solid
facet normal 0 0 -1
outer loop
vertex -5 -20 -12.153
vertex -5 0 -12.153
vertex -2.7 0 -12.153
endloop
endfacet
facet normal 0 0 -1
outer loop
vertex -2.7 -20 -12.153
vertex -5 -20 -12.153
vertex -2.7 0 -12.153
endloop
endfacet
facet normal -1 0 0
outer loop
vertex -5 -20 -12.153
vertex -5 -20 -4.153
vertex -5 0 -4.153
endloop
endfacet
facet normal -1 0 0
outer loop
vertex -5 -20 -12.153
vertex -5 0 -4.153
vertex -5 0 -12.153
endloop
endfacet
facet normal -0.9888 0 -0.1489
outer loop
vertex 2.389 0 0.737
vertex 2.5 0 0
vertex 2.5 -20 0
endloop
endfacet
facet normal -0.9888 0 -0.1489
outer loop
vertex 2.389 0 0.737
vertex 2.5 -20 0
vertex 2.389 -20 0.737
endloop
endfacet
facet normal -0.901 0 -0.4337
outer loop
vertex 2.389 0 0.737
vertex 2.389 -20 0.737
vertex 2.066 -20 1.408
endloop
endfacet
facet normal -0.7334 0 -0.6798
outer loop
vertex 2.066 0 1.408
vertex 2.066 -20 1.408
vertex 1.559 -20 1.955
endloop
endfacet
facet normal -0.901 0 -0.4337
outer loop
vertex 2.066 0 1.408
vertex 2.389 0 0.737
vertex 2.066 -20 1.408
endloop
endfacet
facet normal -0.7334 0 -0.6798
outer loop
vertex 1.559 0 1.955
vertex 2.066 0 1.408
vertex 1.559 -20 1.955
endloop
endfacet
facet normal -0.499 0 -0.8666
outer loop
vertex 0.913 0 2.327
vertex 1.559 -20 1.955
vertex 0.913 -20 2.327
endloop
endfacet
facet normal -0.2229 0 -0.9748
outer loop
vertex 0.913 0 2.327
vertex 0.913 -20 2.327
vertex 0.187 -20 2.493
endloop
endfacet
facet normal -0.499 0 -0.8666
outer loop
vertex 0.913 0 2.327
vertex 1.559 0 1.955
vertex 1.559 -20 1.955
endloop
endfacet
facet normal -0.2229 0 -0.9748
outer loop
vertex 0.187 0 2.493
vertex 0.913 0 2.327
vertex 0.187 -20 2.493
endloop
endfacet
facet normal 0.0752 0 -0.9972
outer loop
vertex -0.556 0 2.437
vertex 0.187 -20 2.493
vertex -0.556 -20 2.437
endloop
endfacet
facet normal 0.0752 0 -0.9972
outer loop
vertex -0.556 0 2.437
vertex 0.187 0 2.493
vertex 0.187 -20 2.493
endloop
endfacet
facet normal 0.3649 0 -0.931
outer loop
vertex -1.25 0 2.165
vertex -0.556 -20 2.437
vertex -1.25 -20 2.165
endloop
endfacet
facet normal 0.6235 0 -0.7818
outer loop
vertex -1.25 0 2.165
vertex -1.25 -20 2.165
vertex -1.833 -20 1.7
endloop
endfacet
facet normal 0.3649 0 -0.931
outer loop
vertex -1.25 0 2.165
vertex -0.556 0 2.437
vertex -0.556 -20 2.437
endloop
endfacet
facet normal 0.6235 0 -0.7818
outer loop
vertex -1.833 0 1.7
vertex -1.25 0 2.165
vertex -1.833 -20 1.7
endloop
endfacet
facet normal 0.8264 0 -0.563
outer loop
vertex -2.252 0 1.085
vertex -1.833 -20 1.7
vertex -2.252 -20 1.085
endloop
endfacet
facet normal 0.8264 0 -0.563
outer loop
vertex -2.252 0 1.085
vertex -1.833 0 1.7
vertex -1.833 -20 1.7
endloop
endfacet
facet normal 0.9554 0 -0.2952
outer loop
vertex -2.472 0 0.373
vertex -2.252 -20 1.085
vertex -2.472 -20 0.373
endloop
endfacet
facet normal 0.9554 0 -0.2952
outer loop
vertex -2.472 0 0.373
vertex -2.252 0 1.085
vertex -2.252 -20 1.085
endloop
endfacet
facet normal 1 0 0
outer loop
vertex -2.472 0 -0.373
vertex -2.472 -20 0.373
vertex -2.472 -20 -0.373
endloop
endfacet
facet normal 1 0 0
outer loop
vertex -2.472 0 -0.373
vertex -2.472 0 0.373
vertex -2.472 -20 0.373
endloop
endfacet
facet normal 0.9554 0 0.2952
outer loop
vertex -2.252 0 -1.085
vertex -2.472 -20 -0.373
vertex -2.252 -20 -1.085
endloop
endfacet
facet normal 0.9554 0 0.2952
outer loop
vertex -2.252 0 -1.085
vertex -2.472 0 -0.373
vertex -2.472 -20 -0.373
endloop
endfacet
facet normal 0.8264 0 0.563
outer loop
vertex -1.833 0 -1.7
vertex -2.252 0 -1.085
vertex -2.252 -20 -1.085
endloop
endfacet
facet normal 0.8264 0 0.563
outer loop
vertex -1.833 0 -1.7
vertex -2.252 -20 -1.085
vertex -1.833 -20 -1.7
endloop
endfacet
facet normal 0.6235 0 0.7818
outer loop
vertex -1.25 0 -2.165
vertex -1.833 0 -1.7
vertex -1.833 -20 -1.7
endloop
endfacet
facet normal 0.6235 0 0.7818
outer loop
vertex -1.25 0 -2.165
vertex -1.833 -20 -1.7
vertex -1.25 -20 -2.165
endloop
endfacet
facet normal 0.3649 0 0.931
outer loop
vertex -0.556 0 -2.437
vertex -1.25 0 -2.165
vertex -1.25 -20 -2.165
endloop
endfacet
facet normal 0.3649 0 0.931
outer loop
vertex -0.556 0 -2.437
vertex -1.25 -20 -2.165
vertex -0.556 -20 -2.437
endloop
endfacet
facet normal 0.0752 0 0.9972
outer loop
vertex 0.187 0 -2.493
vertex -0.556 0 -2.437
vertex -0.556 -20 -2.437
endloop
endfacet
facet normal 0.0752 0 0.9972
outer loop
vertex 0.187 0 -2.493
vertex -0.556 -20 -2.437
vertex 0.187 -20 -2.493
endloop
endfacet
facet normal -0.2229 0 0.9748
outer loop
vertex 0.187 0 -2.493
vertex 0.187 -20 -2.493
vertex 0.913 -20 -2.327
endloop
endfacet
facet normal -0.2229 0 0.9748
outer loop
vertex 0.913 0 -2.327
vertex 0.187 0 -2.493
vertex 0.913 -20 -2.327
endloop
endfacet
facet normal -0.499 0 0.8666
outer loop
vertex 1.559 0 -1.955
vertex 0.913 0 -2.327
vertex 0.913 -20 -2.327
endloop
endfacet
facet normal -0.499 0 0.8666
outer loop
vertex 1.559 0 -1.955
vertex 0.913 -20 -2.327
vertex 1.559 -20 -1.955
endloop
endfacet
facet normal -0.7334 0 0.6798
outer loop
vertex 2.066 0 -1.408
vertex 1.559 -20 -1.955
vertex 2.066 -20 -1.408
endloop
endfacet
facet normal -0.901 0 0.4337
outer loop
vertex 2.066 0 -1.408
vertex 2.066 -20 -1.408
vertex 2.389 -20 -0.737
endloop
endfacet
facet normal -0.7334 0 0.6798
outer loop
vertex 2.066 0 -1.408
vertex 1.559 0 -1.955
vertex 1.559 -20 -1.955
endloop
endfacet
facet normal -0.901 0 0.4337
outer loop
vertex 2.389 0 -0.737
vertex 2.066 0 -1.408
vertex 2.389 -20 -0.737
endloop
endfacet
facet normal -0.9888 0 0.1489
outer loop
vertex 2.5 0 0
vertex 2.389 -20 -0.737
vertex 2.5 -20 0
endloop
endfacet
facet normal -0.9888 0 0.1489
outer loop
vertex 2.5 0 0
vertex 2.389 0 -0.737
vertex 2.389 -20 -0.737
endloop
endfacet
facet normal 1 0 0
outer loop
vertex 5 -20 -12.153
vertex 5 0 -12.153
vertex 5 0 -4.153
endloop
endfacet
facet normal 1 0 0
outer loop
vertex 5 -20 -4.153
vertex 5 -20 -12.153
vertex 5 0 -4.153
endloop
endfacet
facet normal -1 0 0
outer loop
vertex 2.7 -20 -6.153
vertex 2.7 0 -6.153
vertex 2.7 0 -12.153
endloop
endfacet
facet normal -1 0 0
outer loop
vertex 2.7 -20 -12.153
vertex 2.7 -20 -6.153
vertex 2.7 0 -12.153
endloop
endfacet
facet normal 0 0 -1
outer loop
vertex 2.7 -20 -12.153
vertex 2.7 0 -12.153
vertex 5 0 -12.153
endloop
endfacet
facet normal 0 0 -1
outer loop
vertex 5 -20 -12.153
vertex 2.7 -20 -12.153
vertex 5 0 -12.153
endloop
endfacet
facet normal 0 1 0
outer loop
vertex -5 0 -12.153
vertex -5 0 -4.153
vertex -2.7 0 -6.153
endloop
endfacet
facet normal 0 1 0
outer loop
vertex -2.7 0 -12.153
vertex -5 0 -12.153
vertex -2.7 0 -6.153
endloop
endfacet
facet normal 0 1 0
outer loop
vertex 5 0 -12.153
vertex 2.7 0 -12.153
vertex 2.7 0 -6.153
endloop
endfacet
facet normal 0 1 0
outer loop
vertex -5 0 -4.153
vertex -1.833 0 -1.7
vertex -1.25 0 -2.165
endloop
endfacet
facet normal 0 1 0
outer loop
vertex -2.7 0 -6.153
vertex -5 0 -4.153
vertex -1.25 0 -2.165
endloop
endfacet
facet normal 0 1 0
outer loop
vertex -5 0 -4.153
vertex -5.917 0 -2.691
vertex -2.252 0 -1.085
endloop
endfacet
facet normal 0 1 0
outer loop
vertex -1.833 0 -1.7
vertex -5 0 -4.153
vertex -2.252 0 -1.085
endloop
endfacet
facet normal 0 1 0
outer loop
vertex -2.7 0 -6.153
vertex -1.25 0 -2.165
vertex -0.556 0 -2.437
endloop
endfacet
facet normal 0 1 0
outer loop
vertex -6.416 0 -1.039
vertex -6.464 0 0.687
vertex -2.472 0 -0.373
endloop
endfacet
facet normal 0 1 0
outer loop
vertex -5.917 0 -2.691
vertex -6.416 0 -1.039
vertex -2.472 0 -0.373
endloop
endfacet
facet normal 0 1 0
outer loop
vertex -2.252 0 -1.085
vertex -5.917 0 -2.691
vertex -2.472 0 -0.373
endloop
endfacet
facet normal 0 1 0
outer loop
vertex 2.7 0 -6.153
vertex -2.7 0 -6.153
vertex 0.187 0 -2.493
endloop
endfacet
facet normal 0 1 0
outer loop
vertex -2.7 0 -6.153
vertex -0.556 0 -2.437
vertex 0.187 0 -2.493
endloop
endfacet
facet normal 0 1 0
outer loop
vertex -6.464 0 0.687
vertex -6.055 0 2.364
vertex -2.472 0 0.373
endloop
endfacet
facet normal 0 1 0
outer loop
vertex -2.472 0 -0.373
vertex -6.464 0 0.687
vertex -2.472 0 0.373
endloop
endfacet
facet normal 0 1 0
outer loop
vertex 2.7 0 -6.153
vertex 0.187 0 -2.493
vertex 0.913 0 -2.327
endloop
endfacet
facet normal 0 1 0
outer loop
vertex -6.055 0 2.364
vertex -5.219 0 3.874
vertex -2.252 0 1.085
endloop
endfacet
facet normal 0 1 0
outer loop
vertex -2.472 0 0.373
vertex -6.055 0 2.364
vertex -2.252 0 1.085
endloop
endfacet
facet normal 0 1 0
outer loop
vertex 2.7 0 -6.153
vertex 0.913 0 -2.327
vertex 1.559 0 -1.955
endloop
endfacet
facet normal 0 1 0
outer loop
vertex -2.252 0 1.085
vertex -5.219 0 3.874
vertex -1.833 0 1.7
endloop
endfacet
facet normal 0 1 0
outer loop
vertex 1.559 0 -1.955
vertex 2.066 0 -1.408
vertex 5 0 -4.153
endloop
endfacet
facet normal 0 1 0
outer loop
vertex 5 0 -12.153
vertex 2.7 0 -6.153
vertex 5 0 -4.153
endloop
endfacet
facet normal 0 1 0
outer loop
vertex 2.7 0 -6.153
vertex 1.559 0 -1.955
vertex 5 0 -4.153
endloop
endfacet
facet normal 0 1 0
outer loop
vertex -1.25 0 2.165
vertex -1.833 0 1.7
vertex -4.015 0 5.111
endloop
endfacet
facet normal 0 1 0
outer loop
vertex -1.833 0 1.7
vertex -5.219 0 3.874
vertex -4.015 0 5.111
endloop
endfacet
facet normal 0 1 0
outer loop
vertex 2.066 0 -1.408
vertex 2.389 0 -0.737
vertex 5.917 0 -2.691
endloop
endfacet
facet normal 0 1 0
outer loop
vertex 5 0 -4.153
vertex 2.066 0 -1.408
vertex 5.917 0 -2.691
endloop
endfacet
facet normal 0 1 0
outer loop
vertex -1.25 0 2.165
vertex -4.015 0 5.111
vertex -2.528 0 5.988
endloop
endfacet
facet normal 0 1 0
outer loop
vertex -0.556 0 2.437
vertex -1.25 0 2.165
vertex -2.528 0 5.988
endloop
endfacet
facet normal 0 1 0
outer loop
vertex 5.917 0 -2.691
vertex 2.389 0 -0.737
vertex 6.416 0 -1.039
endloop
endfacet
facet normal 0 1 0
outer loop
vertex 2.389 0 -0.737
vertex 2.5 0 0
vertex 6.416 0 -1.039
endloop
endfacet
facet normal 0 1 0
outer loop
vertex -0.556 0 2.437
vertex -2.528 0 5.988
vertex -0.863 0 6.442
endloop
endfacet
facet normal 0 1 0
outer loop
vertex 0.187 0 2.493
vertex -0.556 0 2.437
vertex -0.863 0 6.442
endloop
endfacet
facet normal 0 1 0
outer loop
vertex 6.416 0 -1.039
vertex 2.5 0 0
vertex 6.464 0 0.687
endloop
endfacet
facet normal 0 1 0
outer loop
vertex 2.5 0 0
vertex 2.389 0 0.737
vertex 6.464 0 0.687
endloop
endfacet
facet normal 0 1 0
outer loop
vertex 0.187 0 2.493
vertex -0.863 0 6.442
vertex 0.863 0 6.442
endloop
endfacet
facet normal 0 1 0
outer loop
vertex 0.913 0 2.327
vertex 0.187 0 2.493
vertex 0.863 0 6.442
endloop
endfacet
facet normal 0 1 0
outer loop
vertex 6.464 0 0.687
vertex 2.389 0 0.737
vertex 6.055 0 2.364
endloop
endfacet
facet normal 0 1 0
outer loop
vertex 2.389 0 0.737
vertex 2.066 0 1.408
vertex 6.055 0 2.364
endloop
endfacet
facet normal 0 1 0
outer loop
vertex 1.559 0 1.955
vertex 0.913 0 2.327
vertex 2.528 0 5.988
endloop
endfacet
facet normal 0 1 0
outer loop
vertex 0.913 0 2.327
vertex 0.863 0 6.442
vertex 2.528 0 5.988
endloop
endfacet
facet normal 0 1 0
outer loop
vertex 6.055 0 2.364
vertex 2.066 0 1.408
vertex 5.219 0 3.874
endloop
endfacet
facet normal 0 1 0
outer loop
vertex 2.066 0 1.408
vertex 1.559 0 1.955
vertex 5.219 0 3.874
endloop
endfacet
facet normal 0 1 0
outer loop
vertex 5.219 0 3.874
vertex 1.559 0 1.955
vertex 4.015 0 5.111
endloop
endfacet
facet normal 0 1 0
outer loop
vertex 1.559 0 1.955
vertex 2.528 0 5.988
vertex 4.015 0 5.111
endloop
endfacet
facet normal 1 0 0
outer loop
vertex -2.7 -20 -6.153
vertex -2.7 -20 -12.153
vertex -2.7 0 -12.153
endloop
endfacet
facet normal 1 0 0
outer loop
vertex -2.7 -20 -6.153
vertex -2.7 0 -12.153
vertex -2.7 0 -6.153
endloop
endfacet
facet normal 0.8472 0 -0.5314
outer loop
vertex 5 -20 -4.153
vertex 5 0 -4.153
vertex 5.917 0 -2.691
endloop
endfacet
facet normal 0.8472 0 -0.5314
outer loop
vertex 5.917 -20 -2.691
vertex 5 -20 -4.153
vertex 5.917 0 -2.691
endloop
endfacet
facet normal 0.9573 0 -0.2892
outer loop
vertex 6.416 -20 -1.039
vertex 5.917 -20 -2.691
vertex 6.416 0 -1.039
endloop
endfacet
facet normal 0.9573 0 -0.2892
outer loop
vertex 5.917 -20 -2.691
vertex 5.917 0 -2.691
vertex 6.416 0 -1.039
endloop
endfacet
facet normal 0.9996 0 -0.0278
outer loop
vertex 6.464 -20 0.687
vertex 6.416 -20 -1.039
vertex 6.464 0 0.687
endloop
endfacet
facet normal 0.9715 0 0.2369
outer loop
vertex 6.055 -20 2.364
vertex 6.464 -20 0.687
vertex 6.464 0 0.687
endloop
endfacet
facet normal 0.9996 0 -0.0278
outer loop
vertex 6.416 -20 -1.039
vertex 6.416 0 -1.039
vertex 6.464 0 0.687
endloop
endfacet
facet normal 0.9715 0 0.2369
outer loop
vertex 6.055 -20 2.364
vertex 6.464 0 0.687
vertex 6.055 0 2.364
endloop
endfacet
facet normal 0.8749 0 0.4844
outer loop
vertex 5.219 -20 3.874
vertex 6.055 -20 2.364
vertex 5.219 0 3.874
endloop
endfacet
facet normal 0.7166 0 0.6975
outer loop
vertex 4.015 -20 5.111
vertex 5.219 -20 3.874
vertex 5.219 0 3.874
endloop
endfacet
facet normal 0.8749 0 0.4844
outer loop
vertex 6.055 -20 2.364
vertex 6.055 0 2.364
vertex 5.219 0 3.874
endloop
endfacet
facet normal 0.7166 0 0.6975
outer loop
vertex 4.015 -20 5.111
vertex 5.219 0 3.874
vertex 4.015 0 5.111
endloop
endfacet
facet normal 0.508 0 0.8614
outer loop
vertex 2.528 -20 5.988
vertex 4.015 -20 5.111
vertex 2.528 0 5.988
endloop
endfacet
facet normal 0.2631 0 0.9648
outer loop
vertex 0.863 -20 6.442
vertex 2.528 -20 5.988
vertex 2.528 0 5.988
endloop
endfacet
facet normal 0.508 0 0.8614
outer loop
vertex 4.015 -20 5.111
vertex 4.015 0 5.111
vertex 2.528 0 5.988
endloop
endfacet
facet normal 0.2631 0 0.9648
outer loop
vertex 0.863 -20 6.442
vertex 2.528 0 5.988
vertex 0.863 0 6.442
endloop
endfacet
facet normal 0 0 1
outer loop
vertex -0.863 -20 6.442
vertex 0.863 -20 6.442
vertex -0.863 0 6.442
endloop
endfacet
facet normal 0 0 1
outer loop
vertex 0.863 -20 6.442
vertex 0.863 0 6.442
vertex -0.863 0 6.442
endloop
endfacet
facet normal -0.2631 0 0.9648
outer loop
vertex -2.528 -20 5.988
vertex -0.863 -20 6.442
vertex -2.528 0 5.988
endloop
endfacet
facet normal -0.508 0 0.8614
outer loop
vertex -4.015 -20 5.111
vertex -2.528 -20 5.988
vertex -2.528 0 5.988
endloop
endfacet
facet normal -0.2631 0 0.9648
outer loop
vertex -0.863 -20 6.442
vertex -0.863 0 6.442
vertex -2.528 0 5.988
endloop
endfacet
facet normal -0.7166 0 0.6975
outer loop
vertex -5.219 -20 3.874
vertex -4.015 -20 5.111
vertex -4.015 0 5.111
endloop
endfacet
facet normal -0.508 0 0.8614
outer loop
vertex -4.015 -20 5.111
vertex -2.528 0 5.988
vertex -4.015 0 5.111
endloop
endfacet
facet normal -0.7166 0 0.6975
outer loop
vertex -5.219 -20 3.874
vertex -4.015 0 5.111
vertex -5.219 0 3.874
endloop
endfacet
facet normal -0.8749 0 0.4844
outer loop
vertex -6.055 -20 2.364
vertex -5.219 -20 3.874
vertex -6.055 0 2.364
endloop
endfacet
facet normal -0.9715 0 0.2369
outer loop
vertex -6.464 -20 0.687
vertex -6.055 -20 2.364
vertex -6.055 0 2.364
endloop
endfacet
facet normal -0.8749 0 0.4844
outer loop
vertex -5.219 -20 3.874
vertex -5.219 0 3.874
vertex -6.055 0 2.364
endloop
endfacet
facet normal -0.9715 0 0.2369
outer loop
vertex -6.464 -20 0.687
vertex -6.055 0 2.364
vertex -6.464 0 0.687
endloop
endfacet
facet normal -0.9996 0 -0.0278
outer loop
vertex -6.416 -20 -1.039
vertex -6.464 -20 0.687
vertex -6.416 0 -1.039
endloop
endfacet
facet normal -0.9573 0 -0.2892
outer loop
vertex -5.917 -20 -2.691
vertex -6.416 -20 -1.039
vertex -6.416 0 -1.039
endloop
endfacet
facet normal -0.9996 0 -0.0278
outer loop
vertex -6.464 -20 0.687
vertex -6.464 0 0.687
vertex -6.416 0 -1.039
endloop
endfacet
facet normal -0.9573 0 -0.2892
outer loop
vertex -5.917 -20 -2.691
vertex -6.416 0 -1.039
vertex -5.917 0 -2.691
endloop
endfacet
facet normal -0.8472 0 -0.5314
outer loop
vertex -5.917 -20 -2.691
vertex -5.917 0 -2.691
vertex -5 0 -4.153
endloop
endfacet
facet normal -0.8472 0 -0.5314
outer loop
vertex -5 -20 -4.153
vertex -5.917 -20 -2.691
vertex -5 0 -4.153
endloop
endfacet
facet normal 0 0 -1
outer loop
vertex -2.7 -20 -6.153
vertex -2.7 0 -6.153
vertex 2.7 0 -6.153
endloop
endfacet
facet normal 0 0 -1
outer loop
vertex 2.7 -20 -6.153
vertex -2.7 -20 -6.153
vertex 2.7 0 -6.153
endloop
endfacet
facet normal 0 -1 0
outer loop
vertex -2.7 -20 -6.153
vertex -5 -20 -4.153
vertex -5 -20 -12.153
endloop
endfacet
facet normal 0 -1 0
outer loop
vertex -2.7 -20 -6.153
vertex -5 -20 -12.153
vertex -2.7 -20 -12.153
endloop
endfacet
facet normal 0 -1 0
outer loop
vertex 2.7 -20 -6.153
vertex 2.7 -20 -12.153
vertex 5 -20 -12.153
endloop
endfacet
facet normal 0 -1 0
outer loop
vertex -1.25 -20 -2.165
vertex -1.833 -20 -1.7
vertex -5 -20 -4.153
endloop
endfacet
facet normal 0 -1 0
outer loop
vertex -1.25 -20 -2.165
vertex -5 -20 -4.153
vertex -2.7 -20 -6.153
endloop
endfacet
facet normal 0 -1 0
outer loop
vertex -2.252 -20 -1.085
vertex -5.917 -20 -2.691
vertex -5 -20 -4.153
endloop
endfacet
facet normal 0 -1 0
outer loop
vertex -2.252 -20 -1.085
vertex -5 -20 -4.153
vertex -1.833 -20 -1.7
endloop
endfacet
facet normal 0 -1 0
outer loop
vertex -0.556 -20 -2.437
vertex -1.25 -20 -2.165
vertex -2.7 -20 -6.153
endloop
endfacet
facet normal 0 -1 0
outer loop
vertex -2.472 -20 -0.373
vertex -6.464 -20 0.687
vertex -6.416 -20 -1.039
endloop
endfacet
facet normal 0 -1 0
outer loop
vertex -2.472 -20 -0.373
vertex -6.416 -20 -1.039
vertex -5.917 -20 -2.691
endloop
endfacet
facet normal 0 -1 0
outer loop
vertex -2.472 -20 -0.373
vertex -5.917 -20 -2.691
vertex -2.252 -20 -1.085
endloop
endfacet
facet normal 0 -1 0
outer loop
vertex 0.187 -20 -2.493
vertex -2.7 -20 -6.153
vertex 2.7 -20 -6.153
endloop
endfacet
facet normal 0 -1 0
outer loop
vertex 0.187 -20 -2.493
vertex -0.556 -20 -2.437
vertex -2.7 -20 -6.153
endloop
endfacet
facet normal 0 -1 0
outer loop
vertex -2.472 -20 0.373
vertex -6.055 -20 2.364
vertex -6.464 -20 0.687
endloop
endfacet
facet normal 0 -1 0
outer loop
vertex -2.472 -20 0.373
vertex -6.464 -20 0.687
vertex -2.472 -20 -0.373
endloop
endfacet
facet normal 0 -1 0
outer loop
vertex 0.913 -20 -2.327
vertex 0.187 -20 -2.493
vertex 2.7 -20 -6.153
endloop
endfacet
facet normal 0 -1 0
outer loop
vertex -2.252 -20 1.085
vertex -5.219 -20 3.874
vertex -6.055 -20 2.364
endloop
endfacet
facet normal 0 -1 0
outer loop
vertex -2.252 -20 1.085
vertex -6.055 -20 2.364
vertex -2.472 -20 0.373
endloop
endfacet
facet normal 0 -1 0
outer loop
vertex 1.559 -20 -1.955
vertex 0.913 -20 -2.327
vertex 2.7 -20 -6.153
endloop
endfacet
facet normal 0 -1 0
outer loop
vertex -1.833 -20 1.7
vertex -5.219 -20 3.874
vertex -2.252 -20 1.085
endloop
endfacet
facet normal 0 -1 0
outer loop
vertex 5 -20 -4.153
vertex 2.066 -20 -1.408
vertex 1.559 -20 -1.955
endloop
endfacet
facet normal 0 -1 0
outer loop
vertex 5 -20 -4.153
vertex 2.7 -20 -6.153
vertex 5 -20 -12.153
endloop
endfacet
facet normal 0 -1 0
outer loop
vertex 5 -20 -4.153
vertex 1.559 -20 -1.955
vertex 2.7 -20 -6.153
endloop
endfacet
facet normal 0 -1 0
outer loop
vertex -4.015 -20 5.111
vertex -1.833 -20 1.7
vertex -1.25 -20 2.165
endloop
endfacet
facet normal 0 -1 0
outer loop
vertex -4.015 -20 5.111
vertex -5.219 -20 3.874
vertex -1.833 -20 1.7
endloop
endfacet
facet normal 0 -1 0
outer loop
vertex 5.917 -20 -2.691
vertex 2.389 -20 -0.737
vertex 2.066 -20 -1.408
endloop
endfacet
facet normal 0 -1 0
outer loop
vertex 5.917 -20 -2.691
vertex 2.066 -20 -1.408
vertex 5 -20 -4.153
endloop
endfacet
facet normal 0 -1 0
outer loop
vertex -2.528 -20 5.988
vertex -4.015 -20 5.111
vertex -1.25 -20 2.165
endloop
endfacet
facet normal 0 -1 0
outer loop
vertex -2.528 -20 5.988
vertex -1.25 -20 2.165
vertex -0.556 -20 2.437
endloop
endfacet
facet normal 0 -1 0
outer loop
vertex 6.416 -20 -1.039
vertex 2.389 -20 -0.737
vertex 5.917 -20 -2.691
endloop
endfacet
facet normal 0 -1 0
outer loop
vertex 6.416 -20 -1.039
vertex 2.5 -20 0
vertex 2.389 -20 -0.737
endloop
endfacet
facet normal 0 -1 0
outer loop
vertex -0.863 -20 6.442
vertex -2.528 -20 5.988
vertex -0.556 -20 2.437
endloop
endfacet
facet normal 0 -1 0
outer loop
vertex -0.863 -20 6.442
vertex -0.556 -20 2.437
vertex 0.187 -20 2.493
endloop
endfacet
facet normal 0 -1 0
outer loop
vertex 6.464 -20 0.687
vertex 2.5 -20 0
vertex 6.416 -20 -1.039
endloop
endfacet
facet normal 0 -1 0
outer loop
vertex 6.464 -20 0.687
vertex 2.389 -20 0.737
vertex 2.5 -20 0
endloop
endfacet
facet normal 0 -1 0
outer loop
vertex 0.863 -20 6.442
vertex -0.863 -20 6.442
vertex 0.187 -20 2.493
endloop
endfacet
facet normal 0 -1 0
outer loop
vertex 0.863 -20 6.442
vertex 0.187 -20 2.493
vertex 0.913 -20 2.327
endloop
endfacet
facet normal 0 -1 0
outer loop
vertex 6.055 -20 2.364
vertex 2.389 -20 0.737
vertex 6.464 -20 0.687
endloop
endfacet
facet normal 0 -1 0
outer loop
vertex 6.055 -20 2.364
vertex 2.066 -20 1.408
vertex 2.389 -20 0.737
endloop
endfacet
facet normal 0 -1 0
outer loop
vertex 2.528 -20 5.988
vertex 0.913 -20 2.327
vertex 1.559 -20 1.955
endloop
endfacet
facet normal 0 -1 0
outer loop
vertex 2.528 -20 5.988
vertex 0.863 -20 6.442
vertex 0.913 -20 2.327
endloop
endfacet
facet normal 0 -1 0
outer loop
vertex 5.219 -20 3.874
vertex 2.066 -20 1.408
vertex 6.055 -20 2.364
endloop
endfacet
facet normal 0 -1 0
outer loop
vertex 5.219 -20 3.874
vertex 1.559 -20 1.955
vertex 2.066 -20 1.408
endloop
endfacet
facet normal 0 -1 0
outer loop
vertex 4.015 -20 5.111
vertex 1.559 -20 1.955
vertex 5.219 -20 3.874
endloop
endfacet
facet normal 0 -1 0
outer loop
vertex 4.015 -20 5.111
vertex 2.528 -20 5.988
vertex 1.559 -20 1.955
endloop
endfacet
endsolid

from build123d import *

# Parameters (mm, degrees)
F0_R     = 2.5
F1_DEPTH = 20


with BuildPart() as f1:
    # F0 (on Front) → F1 (new body)
    with BuildSketch(Plane.XZ):
        with BuildLine():
            Line((5, -12.153312), (5, -4.153312))
            ThreePointArc((5, -4.153312), (0, 6.5), (-5, -4.153312))
            Line((-5, -4.153312), (-5, -12.153312))
            Line((-5, -12.153312), (-2.7, -12.153312))
            Line((-2.7, -12.153312), (-2.7, -6.153312))
            Line((-2.7, -6.153312), (2.7, -6.153312))
            Line((2.7, -6.153312), (2.7, -12.153312))
            Line((2.7, -12.153312), (5, -12.153312))
        make_face()
        Circle(F0_R, mode=Mode.SUBTRACT)
    extrude(amount=F1_DEPTH)


solid = f1.part
